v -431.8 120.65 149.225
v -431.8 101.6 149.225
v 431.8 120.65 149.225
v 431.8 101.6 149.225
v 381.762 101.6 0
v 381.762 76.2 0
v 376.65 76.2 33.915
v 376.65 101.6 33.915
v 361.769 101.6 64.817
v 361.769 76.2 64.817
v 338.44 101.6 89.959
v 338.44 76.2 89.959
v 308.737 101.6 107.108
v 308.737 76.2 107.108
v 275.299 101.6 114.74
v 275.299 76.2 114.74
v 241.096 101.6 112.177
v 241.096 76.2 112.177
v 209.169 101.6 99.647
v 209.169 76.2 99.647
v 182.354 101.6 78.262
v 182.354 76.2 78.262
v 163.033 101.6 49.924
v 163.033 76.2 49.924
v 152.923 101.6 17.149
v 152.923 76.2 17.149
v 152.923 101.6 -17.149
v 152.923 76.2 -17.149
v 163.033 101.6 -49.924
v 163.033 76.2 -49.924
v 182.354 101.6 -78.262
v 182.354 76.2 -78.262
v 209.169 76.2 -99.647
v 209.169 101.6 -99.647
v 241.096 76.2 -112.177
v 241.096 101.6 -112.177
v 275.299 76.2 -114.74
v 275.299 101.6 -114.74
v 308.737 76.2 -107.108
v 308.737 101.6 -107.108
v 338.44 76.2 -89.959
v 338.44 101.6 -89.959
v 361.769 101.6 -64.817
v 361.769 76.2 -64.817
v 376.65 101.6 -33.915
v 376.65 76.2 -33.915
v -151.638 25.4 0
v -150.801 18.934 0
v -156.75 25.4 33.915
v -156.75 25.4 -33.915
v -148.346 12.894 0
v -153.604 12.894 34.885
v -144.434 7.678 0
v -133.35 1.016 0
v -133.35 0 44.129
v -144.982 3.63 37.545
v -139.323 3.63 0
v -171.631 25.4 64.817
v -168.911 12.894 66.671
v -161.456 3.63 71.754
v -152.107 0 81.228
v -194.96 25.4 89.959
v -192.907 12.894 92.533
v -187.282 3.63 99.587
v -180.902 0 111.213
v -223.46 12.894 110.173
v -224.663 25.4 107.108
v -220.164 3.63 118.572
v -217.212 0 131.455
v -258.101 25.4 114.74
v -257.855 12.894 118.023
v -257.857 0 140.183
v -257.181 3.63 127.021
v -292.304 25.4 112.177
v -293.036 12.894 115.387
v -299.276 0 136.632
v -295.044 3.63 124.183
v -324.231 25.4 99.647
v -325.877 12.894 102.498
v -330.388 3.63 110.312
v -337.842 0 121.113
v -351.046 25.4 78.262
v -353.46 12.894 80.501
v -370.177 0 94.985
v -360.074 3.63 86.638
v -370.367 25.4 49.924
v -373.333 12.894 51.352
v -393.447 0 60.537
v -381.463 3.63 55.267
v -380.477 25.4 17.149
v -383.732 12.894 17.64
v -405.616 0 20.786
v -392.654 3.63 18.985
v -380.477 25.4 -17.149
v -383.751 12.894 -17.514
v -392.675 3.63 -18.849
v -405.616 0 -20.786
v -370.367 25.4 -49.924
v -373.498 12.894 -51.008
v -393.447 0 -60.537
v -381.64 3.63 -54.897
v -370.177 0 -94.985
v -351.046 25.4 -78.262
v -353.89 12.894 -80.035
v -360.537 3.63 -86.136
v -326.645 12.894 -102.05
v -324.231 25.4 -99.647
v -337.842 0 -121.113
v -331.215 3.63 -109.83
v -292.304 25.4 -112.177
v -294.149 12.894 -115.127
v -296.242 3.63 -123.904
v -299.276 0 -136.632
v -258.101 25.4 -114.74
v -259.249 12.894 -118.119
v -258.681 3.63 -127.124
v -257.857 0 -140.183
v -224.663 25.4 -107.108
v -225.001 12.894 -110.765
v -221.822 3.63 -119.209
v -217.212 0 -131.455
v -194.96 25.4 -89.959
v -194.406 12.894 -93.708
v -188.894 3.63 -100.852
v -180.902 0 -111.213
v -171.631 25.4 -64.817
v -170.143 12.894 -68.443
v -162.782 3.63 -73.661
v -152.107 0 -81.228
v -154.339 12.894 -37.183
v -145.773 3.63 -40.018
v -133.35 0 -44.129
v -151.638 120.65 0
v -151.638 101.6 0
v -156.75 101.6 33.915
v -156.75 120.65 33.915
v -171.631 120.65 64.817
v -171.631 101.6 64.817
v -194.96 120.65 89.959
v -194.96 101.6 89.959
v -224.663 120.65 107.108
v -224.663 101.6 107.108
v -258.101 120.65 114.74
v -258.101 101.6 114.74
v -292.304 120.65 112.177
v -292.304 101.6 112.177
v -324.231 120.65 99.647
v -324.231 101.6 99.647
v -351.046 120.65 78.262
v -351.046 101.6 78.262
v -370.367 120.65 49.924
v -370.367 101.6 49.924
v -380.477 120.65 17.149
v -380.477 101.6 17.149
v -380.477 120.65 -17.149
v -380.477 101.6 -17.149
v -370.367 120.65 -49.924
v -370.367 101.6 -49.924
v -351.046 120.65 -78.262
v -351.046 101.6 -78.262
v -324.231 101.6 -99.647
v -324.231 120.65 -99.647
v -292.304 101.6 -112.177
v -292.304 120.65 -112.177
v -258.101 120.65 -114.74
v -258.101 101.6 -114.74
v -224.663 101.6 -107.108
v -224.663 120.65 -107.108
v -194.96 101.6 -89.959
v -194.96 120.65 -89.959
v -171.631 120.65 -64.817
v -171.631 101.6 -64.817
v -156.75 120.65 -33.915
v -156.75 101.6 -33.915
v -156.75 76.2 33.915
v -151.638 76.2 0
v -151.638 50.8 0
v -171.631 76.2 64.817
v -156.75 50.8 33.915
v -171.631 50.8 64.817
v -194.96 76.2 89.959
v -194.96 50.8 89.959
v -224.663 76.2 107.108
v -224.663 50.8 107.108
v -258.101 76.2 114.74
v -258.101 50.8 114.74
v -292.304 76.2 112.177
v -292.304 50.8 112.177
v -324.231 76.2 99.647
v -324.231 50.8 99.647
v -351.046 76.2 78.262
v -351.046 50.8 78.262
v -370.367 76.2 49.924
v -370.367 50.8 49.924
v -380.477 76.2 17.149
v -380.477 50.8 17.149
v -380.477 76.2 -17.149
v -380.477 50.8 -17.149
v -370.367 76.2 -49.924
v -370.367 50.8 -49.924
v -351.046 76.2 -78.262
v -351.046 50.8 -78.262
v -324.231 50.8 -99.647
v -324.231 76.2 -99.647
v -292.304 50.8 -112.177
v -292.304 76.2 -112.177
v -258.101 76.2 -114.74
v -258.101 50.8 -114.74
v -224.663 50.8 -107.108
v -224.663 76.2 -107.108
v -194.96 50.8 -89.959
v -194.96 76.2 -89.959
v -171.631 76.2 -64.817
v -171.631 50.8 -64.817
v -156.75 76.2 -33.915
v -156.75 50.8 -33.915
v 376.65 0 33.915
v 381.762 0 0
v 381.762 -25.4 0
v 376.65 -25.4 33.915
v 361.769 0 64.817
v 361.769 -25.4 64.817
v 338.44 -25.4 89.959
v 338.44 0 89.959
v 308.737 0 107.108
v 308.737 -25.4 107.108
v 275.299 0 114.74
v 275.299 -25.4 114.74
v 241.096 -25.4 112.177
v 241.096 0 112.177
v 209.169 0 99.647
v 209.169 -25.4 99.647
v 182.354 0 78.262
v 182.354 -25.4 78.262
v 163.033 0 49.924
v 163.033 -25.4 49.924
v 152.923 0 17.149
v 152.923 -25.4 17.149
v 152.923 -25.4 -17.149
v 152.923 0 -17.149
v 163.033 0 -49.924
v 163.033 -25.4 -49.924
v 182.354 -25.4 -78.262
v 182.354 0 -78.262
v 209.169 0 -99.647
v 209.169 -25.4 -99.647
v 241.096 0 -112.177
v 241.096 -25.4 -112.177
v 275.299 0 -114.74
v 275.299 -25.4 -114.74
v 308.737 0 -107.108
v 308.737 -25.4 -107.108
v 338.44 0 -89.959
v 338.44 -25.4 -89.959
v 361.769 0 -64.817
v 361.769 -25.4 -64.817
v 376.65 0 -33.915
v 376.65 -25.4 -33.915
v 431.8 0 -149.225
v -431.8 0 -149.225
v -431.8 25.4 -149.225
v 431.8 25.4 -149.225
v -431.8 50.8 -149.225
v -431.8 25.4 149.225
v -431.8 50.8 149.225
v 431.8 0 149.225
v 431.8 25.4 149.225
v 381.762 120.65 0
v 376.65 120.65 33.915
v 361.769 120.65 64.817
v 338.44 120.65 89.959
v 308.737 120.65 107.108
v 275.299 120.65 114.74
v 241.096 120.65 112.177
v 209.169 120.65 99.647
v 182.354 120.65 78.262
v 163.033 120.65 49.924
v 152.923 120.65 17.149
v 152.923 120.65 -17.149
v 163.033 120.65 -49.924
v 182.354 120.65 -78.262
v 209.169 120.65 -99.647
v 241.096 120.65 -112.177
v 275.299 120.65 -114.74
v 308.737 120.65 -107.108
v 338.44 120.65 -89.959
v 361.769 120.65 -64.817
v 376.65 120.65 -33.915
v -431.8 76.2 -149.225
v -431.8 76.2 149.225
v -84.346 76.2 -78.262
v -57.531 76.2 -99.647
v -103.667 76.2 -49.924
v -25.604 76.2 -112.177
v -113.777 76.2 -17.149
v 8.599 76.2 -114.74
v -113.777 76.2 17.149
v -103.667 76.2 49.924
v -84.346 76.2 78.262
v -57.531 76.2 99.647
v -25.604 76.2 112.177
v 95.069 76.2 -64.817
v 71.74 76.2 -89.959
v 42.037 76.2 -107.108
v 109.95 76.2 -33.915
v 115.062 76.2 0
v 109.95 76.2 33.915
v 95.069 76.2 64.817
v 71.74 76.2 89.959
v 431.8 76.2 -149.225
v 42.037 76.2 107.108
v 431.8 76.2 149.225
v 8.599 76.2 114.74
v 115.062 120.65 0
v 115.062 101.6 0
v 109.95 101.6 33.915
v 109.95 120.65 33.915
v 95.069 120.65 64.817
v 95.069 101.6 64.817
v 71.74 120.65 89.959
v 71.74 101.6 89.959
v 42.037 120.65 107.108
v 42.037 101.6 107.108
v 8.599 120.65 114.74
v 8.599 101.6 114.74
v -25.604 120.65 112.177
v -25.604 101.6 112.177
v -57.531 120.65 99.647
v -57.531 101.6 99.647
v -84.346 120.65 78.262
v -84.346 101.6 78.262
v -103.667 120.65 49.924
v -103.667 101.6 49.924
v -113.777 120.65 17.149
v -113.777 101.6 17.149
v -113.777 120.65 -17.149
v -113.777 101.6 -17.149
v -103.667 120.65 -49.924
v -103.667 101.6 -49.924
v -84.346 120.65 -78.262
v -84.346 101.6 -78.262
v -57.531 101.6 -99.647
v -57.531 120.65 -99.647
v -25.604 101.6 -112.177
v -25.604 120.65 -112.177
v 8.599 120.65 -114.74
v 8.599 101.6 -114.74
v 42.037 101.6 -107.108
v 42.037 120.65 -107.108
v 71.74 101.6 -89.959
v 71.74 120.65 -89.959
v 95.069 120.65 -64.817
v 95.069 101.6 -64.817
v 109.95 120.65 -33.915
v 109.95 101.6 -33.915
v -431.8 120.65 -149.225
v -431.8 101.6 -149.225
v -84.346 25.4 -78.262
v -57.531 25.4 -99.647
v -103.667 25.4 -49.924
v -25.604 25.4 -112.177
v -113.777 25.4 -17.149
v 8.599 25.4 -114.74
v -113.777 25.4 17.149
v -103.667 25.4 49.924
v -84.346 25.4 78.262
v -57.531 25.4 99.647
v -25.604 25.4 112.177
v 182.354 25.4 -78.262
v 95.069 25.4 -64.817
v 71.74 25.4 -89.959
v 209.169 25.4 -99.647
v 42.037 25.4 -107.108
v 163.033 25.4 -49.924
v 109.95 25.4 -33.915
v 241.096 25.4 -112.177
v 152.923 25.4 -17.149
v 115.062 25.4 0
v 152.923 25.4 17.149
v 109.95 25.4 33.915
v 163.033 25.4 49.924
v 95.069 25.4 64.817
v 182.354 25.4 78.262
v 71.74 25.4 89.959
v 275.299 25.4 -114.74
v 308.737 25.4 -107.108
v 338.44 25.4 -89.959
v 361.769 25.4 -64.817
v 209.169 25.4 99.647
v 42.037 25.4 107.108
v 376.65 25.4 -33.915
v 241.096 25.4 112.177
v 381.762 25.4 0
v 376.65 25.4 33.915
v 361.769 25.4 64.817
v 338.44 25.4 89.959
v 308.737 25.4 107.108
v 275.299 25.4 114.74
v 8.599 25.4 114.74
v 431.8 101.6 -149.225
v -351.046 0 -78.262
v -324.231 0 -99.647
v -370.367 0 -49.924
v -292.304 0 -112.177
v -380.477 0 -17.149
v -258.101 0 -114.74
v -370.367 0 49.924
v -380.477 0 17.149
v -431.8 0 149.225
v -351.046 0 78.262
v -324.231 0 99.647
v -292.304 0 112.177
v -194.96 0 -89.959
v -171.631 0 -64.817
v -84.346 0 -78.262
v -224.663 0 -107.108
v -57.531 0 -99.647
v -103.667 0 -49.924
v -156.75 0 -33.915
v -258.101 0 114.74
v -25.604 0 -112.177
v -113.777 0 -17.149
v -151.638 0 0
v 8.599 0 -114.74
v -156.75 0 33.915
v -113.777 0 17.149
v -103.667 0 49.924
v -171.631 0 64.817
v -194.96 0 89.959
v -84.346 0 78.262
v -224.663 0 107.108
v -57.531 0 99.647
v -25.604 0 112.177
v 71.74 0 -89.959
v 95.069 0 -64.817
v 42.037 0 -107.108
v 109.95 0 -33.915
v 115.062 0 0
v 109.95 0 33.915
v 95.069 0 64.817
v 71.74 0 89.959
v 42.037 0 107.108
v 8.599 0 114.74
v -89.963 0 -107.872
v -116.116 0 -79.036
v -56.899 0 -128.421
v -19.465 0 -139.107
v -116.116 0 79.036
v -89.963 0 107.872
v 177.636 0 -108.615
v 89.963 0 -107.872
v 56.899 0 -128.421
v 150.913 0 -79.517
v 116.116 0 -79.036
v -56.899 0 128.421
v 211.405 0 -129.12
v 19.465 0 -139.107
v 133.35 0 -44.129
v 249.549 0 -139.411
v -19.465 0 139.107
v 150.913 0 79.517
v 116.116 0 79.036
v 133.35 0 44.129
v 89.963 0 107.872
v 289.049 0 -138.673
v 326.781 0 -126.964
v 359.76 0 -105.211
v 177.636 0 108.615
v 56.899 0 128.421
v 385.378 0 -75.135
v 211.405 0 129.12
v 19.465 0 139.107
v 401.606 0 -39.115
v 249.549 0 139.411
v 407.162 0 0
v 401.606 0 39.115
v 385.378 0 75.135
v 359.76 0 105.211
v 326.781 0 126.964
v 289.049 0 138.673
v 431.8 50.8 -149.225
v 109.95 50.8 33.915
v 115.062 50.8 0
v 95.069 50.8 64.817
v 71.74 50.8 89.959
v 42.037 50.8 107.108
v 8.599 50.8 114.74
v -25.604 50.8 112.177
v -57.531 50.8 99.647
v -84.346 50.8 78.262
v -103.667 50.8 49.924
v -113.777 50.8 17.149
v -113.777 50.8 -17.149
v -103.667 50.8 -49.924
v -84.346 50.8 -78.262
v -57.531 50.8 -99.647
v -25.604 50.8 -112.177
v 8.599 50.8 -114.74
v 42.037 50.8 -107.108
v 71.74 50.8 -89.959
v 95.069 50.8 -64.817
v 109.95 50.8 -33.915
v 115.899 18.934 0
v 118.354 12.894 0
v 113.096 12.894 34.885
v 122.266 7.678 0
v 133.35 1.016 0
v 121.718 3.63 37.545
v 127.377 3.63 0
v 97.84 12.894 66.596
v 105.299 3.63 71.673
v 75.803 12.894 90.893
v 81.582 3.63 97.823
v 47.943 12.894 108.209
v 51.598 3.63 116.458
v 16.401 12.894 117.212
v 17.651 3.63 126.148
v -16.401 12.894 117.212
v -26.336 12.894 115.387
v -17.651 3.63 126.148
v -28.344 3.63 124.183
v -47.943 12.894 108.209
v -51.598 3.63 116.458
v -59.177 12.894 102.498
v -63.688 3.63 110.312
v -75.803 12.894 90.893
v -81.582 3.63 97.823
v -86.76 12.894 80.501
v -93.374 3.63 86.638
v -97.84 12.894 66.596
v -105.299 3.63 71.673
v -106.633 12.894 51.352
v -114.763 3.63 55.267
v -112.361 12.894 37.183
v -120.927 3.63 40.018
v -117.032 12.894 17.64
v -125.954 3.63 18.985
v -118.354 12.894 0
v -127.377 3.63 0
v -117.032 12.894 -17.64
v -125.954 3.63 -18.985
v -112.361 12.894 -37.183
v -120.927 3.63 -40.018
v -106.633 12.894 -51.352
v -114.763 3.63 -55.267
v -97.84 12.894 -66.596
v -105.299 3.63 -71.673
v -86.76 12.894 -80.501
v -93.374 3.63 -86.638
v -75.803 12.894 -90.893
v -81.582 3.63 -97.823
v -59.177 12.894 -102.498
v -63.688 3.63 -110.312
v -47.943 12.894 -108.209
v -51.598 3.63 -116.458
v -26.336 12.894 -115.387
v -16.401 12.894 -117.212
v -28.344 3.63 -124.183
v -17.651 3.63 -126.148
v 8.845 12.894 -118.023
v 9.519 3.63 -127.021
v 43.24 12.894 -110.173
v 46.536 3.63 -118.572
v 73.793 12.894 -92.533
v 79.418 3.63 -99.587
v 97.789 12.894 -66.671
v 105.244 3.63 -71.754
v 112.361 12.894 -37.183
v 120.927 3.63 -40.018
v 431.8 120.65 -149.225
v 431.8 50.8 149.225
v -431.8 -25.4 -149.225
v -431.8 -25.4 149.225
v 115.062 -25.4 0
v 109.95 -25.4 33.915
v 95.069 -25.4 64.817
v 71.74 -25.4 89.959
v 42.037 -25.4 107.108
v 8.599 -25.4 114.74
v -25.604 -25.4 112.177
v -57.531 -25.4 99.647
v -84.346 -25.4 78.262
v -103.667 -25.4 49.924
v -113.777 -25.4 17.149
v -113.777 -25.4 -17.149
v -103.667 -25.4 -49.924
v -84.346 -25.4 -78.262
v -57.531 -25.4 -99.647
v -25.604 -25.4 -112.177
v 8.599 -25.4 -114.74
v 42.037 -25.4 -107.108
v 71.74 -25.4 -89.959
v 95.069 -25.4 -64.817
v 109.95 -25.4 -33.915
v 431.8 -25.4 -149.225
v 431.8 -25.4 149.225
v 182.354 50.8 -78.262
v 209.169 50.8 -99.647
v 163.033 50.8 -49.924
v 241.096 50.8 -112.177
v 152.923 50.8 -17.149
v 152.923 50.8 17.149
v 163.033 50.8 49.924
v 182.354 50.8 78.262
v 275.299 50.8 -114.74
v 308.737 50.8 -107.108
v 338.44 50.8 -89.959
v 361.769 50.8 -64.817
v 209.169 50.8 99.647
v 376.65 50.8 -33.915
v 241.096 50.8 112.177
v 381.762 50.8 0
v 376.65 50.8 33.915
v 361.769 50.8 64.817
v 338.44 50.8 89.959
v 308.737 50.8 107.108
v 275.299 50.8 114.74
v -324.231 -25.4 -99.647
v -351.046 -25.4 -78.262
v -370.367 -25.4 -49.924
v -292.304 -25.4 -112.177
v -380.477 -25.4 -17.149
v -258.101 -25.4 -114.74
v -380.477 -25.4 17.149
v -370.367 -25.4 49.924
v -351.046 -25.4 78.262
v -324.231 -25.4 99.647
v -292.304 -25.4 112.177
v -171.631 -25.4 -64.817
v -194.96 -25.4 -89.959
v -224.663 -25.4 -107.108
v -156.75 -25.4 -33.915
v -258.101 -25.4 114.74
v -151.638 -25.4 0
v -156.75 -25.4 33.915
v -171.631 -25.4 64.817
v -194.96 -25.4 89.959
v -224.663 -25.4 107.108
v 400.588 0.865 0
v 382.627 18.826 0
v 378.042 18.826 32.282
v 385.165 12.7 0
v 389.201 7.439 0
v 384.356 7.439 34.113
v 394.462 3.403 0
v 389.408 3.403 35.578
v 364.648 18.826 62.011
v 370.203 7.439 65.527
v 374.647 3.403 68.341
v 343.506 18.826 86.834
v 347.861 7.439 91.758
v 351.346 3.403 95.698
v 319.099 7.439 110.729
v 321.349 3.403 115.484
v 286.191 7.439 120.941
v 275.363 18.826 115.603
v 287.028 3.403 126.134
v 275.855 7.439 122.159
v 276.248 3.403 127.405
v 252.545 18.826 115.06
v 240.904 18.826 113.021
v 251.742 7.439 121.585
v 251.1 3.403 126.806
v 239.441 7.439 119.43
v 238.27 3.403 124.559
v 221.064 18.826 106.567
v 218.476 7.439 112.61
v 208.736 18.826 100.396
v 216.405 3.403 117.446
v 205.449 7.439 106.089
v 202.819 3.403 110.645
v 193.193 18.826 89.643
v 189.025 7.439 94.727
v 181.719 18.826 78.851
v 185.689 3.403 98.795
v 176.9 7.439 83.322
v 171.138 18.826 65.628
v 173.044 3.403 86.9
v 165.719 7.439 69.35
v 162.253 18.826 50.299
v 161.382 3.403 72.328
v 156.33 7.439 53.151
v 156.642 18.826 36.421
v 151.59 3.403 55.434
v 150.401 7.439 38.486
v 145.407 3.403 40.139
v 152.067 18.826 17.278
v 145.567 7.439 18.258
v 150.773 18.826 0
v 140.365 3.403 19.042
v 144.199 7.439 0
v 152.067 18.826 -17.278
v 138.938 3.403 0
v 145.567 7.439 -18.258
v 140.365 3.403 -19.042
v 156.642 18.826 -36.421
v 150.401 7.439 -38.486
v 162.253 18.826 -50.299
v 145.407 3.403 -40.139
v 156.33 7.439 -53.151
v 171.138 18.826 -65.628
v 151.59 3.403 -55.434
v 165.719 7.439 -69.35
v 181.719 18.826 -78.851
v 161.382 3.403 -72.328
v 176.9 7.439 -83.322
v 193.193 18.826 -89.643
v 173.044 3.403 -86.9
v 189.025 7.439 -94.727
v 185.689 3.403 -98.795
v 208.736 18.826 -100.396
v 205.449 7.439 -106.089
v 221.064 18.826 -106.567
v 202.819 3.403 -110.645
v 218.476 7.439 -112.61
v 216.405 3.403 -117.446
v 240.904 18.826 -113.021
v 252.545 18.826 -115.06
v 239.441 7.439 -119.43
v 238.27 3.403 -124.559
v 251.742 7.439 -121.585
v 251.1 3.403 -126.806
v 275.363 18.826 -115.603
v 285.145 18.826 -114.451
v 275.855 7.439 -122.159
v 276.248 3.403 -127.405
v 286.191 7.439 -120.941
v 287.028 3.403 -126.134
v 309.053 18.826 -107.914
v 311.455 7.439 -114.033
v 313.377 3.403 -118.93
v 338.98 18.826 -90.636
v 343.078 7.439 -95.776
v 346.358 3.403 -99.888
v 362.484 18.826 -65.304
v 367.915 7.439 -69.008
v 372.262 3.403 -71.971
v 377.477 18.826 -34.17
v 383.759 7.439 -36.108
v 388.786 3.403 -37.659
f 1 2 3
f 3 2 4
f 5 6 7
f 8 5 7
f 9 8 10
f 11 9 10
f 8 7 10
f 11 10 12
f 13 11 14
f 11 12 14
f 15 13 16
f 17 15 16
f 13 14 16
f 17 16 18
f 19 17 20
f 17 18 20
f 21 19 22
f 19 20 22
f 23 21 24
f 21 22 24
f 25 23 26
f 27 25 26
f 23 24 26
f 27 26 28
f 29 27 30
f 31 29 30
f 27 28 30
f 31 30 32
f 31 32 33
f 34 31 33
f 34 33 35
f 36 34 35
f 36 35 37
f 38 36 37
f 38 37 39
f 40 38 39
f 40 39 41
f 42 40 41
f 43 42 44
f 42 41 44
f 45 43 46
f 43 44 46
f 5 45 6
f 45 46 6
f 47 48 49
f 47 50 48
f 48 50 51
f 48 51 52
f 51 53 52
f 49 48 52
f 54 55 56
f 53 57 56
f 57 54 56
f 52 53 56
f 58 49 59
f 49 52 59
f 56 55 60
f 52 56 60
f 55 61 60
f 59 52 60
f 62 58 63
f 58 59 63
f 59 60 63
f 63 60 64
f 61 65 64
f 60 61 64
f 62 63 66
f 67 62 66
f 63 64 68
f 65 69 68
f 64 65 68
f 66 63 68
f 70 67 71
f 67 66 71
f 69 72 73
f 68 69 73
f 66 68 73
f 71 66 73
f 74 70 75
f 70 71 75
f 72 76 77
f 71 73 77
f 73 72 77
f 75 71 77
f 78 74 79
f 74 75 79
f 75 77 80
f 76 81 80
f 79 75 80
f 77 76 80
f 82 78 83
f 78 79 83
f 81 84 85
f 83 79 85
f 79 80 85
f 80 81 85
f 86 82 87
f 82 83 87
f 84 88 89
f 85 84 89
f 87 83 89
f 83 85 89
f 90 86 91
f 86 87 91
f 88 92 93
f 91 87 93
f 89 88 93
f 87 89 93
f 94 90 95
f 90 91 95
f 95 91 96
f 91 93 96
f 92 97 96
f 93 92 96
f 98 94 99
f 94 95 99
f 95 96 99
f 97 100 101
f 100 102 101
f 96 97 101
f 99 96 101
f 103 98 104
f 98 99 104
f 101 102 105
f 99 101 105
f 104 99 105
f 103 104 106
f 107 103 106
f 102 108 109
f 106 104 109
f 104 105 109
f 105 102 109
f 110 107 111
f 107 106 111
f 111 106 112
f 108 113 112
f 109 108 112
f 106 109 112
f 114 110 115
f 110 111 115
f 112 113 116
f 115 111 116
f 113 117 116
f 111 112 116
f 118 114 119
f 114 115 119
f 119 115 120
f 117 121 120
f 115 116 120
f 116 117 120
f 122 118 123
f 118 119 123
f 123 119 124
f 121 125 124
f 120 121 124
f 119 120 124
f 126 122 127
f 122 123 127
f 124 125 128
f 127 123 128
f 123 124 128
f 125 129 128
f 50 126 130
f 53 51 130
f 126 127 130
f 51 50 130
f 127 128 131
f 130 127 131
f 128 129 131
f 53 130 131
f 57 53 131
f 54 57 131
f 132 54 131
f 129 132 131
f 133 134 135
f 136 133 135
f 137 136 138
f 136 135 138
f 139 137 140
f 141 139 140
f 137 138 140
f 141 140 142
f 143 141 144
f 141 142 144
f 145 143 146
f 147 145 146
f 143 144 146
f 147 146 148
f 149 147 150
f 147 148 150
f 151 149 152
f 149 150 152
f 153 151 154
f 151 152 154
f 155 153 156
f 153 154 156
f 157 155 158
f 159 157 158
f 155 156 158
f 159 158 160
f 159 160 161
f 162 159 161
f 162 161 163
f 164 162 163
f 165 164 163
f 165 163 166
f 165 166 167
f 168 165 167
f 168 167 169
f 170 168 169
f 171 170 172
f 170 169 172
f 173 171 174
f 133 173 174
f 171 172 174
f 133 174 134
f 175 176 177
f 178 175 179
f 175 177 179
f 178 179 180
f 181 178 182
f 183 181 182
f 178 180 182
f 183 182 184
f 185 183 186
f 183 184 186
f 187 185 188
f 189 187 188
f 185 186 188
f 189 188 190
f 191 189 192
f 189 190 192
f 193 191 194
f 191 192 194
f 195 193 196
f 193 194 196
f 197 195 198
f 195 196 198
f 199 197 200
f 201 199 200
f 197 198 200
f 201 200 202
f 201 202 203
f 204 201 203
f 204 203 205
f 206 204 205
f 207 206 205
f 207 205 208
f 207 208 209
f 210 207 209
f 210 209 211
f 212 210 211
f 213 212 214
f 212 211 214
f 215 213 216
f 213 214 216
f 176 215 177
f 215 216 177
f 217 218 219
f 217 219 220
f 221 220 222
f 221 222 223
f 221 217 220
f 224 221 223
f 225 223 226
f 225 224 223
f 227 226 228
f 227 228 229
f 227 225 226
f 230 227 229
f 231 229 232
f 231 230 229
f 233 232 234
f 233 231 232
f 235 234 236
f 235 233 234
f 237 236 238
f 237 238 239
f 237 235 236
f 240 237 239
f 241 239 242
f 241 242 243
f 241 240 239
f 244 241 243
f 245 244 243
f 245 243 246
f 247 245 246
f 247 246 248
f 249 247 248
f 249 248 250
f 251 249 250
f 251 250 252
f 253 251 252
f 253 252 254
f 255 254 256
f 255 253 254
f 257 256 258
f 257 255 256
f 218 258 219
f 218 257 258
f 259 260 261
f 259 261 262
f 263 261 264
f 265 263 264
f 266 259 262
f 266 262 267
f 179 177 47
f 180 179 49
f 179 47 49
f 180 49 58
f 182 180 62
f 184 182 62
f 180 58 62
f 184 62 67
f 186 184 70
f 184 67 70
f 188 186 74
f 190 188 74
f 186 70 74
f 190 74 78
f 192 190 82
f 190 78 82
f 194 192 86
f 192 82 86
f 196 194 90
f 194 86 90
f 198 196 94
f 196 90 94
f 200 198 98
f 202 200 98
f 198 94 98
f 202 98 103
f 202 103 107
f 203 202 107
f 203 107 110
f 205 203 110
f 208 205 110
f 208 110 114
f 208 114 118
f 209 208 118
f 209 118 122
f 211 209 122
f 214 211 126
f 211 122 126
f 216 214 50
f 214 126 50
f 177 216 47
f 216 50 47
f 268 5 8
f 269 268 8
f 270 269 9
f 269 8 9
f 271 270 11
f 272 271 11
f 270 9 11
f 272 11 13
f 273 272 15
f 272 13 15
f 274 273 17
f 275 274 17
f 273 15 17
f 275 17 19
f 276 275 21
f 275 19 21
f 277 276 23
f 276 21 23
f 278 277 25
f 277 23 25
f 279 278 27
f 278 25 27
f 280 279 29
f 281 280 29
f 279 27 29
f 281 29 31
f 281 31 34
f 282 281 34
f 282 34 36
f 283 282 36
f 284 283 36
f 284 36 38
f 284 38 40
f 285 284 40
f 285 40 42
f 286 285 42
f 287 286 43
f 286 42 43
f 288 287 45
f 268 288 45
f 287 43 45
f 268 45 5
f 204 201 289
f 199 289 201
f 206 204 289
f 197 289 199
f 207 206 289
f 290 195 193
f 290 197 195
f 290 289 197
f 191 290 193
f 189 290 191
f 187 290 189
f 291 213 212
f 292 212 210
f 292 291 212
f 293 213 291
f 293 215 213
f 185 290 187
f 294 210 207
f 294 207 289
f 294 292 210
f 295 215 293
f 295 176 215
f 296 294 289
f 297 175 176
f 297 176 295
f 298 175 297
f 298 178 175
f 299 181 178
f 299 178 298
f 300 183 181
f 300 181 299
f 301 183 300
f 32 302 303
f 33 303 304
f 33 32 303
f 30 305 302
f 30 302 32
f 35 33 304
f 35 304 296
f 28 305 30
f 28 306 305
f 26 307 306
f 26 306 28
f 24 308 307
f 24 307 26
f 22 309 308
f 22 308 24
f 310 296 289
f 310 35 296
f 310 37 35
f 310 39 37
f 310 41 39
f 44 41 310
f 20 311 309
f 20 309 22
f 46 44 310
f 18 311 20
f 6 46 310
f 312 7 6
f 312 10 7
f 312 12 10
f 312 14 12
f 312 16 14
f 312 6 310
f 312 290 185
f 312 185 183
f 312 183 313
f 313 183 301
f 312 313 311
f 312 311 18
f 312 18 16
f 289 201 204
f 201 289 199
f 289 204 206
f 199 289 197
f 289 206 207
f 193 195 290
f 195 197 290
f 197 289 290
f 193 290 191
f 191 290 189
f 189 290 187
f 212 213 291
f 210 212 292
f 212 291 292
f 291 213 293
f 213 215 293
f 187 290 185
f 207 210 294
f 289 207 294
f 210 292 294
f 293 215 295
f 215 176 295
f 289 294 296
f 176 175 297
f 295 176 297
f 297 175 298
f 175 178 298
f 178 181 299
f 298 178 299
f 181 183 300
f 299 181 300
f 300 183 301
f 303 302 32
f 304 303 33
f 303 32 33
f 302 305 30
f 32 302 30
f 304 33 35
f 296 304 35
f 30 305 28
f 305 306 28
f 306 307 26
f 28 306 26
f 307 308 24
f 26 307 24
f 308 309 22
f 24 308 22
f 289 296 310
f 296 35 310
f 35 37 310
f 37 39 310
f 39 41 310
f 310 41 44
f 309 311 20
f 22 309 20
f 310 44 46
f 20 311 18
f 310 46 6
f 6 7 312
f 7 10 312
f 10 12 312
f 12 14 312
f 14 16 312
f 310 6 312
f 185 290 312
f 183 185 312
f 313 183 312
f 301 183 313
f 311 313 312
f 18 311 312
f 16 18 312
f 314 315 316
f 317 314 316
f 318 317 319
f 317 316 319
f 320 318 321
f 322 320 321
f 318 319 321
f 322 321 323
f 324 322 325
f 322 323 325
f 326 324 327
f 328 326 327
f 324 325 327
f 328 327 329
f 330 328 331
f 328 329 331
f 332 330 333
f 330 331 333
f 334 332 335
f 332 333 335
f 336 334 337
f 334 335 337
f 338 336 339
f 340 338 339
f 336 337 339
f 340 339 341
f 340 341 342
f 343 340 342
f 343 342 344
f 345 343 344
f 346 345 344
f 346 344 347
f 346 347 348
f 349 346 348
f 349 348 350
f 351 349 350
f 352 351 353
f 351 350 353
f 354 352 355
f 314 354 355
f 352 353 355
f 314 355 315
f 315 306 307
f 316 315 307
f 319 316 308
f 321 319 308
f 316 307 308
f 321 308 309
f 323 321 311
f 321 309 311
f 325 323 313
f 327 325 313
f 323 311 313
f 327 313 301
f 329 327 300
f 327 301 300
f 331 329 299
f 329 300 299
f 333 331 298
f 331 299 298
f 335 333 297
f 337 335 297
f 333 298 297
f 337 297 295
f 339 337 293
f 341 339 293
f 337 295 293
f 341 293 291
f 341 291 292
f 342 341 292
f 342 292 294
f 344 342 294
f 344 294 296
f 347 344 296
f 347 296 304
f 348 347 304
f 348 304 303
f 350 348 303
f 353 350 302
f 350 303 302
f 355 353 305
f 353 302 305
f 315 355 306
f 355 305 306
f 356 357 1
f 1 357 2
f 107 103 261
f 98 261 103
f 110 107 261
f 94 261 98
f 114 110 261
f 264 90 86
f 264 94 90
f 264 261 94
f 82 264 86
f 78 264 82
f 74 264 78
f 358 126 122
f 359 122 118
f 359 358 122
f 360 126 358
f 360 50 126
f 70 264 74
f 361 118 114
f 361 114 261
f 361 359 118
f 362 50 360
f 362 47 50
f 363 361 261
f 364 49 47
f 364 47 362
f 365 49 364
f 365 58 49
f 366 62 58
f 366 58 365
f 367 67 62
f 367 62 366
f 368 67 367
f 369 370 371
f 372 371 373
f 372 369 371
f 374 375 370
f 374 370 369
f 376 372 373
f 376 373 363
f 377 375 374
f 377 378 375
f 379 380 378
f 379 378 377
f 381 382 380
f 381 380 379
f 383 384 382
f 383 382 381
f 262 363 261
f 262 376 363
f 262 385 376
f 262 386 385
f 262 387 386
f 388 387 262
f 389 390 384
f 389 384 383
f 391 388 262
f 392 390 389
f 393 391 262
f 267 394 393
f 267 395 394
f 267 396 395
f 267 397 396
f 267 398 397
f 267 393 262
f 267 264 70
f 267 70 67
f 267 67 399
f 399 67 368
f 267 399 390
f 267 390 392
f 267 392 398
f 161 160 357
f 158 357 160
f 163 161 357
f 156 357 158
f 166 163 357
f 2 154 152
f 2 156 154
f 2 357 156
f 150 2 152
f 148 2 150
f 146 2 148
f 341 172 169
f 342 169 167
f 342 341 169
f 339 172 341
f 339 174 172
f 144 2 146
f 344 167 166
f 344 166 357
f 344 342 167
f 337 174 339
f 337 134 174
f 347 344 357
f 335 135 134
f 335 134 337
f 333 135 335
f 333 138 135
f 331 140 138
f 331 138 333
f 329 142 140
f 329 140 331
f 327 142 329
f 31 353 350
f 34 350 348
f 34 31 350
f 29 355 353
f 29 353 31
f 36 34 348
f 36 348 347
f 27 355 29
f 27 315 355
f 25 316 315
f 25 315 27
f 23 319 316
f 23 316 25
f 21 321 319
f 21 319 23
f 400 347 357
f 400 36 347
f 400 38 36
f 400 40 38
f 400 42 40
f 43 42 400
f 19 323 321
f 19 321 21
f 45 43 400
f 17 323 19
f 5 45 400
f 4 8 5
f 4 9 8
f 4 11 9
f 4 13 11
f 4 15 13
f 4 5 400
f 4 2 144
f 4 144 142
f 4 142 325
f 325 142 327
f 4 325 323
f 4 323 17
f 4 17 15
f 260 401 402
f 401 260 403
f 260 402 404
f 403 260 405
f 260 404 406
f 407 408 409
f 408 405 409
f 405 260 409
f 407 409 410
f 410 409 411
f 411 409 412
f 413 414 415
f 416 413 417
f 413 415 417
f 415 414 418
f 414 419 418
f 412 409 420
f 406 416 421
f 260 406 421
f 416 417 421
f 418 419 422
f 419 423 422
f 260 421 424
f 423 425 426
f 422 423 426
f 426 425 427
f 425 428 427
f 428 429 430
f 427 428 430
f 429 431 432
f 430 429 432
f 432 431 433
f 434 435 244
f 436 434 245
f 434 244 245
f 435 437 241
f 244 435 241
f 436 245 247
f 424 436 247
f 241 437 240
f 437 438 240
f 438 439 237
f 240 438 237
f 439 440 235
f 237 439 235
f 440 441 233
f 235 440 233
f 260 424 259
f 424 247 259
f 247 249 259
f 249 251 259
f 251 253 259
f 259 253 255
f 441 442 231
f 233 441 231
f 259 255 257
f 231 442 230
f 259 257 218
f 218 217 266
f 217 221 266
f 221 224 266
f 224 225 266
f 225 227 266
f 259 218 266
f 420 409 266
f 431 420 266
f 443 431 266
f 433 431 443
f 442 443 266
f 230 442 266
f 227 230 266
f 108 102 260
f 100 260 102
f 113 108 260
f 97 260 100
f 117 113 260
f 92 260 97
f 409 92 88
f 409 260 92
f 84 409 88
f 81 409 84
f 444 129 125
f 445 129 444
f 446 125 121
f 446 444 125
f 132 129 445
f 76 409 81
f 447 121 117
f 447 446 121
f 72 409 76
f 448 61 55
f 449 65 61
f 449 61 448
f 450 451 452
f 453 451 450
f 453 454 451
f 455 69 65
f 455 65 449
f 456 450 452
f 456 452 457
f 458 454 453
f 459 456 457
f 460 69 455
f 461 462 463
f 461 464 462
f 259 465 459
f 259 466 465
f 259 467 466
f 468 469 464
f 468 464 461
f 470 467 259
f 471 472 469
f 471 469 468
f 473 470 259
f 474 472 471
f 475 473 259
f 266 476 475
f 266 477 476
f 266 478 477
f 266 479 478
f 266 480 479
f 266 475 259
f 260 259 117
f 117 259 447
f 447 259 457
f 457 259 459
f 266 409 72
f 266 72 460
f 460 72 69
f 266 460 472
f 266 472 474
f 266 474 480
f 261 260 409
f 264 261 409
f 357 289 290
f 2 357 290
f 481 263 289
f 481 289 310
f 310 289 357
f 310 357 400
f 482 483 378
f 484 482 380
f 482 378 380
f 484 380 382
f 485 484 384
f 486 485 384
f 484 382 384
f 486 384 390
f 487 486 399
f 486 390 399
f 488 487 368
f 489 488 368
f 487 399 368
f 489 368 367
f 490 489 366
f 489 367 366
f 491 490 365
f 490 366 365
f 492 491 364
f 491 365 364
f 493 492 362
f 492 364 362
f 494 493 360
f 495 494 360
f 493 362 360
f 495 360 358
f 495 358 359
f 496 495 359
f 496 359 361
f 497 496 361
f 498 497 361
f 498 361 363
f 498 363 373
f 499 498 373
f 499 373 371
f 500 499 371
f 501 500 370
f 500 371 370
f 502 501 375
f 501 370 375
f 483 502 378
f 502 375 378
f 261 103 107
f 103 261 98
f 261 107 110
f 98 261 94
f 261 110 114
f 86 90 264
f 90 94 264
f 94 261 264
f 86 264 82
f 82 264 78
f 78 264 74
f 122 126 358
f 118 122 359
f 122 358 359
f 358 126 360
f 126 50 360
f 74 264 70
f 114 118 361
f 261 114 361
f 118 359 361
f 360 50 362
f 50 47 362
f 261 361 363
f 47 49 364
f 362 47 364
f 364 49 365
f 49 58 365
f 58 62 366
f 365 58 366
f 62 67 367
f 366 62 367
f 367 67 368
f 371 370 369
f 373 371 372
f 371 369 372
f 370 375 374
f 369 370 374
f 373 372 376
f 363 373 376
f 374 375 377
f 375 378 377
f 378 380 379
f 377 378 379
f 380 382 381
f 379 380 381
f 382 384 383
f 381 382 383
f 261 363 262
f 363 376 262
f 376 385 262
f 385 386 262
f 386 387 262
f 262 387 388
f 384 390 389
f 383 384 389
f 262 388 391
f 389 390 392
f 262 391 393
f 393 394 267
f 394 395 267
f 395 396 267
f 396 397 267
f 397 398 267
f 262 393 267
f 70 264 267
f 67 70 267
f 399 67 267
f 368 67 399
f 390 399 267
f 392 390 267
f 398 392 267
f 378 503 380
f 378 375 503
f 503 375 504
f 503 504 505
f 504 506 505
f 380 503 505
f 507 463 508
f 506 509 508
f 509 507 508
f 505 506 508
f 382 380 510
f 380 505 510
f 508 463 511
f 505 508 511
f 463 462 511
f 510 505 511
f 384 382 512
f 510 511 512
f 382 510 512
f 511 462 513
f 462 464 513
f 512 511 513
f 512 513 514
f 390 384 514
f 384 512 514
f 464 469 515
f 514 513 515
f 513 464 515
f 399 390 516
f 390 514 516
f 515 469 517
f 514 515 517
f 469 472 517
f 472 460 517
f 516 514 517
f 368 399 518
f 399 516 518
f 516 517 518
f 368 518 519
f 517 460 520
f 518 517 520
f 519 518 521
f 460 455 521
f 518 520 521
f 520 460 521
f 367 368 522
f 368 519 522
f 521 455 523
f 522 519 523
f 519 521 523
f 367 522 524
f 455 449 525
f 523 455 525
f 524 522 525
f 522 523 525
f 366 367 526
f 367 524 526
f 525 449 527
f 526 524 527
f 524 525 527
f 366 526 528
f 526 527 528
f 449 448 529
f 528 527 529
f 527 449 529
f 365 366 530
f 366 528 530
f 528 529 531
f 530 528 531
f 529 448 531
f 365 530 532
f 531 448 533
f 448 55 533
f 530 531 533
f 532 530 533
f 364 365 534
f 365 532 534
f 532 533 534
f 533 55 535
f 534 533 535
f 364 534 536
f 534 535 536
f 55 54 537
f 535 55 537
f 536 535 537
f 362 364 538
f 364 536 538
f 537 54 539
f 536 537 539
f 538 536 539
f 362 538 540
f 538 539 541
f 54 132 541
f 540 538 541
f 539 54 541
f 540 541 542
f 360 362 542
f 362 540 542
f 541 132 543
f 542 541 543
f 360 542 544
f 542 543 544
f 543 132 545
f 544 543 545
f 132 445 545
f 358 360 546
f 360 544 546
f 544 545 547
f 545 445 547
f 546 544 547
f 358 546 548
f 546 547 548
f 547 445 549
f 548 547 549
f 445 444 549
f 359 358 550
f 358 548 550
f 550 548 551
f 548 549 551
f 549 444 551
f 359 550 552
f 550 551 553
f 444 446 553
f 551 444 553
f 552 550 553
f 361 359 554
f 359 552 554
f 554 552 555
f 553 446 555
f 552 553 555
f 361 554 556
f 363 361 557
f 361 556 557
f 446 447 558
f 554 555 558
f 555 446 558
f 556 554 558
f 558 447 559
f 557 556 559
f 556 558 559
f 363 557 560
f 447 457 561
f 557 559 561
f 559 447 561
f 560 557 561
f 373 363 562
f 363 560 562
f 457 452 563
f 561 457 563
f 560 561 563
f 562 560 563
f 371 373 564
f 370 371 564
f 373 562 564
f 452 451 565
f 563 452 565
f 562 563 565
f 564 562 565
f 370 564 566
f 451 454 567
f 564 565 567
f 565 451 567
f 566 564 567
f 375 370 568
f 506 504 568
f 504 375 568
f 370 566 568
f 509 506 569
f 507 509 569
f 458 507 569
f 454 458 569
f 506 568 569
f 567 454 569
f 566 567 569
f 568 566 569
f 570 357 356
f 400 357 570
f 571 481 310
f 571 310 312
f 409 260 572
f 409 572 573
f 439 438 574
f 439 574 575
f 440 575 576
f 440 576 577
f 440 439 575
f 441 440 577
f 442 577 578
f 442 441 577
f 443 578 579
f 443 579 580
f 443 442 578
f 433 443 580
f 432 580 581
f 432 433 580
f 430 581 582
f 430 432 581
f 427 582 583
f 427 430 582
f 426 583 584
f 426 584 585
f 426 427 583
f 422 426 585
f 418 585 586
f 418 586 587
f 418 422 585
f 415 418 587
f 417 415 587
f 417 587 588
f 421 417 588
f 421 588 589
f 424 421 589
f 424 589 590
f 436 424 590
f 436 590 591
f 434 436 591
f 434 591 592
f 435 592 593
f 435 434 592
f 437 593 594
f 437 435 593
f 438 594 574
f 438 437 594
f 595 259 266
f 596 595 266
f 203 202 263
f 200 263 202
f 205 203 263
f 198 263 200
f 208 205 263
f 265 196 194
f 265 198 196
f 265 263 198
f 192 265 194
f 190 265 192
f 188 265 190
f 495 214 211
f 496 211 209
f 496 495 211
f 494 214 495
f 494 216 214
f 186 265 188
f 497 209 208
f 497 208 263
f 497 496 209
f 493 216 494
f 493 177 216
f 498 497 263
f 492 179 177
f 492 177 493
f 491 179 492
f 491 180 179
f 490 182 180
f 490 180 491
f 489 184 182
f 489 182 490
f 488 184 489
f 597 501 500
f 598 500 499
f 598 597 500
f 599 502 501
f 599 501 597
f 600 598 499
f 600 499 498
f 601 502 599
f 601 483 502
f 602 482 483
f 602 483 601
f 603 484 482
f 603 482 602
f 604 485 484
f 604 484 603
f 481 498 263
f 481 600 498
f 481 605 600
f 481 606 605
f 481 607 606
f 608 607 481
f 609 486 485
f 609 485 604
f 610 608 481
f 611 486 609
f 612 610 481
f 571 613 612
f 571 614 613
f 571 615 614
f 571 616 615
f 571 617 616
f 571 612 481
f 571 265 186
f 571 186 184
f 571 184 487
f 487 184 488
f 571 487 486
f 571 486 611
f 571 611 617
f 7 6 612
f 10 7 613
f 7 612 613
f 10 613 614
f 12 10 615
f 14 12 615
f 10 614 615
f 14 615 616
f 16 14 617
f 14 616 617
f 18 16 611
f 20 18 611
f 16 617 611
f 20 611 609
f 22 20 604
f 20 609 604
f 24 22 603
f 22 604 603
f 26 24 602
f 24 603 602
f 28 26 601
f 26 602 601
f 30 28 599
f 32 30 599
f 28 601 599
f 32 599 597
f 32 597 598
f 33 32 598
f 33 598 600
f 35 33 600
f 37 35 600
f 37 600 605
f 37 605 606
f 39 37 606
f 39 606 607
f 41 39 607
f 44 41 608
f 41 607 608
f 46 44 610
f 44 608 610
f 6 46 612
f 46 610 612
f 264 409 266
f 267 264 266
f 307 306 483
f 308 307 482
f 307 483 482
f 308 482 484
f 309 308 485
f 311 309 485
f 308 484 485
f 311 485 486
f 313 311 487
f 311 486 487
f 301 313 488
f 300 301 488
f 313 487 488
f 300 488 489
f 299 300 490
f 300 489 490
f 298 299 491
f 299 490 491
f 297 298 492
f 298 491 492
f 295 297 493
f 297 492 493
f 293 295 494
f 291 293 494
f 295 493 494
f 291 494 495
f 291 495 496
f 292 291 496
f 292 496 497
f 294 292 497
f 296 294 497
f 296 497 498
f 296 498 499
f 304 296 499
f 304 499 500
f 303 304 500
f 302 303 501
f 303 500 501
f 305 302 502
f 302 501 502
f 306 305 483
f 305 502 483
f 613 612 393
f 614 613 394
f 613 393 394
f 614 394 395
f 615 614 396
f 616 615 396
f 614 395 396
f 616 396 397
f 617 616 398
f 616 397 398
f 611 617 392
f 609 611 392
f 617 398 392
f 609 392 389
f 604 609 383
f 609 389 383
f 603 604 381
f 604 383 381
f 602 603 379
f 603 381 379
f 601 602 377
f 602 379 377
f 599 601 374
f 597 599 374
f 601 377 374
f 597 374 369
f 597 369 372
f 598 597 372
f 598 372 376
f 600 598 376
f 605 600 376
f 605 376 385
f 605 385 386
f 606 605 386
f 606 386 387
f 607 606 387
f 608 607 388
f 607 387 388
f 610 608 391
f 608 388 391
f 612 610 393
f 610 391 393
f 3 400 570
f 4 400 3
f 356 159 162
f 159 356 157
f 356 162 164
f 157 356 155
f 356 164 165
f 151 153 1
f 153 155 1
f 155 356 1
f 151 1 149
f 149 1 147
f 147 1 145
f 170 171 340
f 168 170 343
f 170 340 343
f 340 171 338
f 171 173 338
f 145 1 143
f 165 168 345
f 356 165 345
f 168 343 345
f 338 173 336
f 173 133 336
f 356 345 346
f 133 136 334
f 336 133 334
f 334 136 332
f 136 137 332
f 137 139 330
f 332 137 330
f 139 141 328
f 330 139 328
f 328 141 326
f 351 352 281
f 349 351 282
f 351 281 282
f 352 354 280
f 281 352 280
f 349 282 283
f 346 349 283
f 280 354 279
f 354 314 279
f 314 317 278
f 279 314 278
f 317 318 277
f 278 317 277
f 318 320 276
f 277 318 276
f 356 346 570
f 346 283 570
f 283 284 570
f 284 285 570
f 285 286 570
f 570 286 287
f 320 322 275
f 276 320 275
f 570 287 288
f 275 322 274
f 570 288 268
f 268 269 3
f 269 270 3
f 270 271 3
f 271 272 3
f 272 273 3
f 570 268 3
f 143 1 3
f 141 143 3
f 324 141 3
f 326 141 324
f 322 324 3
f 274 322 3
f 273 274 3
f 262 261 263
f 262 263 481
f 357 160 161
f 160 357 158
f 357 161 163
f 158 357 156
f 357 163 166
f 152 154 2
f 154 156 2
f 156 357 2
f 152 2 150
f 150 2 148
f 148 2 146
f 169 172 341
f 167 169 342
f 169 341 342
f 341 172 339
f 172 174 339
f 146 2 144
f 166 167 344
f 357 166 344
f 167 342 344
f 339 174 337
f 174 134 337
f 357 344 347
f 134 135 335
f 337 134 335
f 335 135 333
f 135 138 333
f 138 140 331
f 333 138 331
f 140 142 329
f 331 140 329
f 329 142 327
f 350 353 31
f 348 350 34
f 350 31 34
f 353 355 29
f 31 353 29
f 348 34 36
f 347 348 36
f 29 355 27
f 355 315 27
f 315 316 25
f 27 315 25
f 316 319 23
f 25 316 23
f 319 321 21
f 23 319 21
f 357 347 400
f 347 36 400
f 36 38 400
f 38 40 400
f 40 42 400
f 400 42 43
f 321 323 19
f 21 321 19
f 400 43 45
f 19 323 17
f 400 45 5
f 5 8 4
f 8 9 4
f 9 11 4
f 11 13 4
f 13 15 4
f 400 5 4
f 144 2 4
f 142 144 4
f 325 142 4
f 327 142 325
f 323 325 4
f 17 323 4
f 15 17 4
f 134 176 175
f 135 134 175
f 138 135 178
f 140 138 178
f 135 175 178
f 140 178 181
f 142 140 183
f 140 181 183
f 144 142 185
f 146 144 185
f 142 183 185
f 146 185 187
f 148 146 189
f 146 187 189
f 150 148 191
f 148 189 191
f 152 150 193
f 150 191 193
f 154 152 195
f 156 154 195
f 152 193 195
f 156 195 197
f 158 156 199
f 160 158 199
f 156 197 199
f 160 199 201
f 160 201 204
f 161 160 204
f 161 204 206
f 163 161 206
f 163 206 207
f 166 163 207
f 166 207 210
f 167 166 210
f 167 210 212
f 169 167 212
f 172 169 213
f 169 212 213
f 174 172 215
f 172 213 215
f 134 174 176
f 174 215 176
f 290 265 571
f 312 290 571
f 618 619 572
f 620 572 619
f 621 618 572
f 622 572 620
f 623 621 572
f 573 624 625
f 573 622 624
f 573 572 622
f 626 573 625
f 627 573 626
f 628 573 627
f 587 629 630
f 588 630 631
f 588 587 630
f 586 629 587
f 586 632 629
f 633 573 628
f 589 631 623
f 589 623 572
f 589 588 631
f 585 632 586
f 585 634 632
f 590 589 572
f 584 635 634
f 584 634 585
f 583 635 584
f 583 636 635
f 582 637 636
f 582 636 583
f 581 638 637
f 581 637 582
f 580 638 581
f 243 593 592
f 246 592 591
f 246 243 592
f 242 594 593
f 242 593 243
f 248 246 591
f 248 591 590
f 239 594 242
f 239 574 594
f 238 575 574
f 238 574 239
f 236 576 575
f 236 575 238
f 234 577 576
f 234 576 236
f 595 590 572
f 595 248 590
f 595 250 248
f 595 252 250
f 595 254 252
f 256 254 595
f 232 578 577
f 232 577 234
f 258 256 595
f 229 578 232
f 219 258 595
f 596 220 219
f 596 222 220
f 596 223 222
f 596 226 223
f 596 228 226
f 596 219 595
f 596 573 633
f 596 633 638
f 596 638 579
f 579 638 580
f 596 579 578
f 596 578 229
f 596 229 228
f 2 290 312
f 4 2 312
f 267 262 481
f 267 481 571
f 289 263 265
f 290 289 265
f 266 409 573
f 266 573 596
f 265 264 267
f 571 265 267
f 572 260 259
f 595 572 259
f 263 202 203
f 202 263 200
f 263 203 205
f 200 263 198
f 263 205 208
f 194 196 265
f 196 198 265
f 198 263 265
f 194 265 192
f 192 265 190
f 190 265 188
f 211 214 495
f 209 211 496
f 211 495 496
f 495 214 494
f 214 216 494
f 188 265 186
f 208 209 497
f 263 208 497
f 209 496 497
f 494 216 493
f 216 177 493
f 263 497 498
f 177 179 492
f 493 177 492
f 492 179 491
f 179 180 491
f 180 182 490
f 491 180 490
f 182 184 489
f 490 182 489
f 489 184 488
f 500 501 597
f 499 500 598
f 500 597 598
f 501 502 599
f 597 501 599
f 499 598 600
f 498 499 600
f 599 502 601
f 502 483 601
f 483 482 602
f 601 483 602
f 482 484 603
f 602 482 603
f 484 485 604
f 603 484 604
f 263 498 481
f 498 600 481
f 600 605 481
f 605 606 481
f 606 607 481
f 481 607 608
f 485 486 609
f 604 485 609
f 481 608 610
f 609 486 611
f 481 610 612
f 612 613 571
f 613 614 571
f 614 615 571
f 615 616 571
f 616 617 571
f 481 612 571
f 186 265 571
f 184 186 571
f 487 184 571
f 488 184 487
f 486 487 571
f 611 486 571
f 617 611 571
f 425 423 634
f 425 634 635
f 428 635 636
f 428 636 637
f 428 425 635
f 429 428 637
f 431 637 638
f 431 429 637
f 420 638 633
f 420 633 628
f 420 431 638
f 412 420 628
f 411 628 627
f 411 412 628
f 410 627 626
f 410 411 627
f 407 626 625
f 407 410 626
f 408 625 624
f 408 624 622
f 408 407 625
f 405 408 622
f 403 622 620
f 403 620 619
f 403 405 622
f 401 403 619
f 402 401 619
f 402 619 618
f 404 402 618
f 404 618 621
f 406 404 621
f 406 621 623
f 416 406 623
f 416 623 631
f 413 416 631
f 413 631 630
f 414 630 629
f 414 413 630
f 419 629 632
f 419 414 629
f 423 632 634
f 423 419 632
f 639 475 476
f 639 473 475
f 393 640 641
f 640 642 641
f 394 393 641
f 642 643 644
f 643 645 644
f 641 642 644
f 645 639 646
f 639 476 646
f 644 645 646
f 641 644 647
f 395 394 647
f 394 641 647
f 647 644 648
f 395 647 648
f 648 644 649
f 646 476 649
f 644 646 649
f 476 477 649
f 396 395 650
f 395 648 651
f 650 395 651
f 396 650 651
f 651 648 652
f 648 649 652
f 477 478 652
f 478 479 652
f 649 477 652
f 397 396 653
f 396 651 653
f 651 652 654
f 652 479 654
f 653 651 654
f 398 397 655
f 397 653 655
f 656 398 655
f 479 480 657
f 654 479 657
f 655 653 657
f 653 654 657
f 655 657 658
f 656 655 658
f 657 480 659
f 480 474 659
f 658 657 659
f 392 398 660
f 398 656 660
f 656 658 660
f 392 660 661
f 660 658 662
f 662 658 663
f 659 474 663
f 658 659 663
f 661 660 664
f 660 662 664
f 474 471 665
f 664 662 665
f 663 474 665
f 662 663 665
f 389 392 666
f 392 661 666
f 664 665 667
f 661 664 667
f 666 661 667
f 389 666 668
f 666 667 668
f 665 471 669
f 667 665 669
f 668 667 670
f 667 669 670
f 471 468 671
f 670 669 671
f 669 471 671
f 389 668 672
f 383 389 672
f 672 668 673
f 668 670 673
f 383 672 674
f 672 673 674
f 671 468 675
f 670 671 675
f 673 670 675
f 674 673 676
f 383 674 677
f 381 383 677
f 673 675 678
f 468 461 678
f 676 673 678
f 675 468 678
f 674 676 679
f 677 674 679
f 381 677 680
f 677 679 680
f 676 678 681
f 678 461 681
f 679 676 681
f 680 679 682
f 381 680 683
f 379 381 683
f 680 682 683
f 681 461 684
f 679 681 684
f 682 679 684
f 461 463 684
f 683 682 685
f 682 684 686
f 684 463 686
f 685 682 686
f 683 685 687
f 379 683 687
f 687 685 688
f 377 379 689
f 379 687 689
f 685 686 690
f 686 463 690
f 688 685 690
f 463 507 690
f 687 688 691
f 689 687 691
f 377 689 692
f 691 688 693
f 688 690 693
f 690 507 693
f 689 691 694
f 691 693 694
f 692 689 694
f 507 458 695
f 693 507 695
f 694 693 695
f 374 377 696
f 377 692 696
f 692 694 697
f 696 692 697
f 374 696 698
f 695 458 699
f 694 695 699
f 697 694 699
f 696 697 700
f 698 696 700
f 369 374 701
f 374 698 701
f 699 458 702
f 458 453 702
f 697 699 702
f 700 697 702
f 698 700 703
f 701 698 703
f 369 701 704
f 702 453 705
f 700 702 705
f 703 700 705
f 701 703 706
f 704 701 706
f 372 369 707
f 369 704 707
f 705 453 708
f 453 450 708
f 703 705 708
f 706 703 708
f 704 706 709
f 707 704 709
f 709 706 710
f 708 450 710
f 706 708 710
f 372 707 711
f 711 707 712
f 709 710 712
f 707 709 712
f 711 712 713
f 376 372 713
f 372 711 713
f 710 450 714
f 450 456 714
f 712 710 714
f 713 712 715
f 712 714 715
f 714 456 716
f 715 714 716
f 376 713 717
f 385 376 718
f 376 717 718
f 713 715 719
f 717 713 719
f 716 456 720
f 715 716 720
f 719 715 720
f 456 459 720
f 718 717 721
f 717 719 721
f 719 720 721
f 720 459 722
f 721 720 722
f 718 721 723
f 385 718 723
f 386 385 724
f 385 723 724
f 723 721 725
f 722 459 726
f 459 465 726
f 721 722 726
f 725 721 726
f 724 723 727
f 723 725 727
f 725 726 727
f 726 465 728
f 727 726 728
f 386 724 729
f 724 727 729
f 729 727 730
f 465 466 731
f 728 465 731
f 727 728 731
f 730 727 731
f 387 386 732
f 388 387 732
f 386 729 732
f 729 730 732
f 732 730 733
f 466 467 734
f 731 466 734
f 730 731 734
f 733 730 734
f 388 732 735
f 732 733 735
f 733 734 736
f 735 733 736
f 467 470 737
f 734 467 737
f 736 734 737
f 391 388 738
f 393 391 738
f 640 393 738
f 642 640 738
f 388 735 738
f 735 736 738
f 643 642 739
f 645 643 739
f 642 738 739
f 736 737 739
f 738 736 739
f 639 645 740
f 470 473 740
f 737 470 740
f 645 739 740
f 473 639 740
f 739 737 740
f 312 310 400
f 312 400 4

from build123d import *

# Parameters (mm, degrees)
F0_W     = 863.6
F0_H     = 298.45
F0_R     = 115.062
F1_DEPTH = 25.4
F2_DEPTH = 25.4
F3_DEPTH = 25.4
F4_DEPTH = 25.4
F5_DEPTH = 25.4
F6_DEPTH = 19.05


# Not quite as in the source:
# - a fillet or chamfer that OpenCascade refuses, or shapes differently, is made with other operations: its cross-section is extruded or revolved along the edge and cut away or added


with BuildPart() as f1:
    # F0 (on Front) → F1 (new body)
    with BuildSketch(Plane.XZ):
        Rectangle(F0_W, F0_H)
        with Locations((-266.7, 0)):
            Circle(F0_R, mode=Mode.SUBTRACT)
        Circle(F0_R, mode=Mode.SUBTRACT)
        with Locations((266.7, 0)):
            Circle(F0_R, mode=Mode.SUBTRACT)
    extrude(amount=F1_DEPTH)


with BuildPart() as f2:
    # F2 (new): a face of the model
    f2_faces = [f1.part.faces().sort_by_distance(p)[0] for p in [
        (422.6628376259, 0, 0),
    ]]
    extrude(f2_faces, amount=F2_DEPTH)


with BuildPart() as f3:
    # F3 (new): a face of the model
    f3_faces = [f2.part.faces().sort_by_distance(p)[0] for p in [
        (422.6628376259, 25.4, 0),
    ]]
    extrude(f3_faces, amount=F3_DEPTH)


with BuildPart() as f4:
    # F4 (new): a face of the model
    f4_faces = [f3.part.faces().sort_by_distance(p)[0] for p in [
        (422.6628376259, 50.8, 0),
    ]]
    extrude(f4_faces, amount=F4_DEPTH)


with BuildPart() as f5:
    # F5 (new): a face of the model
    f5_faces = [f4.part.faces().sort_by_distance(p)[0] for p in [
        (422.6628376259, 76.2, 0),
    ]]
    extrude(f5_faces, amount=F5_DEPTH)


with BuildPart() as f6:
    # F6 (new): a face of the model
    f6_faces = [f5.part.faces().sort_by_distance(p)[0] for p in [
        (422.6628376259, 101.6, 0),
    ]]
    extrude(f6_faces, amount=F6_DEPTH)


with BuildPart() as f2_1:
    add(f2.part)

    # F7: fillet of radius 25.4 on 3 edges, made by hand

    # F7_s1 → F7_t2 (revolve, cut)
    with BuildSketch(Plane.XY):
        with BuildLine():
            ThreePointArc((-151.638, 25.4), (-144.1985122421, 7.4394877579), (-126.238, 0))
            Line((-126.238, 0), (-151.638, 0))
            Line((-151.638, 0), (-151.638, 25.4))
        make_face()
    revolve(axis=Axis((-266.7, 0, 0), (0, -1, 0)), mode=Mode.SUBTRACT)

    # F7_s3 → F7_t4 (revolve, cut)
    with BuildSketch(Plane.XY):
        with BuildLine():
            ThreePointArc((115.062, 25.4), (122.5014877579, 7.4394877579), (140.462, 0))
            Line((140.462, 0), (115.062, 0))
            Line((115.062, 0), (115.062, 25.4))
        make_face()
    revolve(axis=Axis((0, 0, 0), (0, -1, 0)), mode=Mode.SUBTRACT)

    # F7_s5 → F7_t6 (revolve, cut)
    with BuildSketch(Plane.XY):
        with BuildLine():
            ThreePointArc((381.762, 25.4), (389.2014877579, 7.4394877579), (407.162, 0))
            Line((407.162, 0), (381.762, 0))
            Line((381.762, 0), (381.762, 25.4))
        make_face()
    revolve(axis=Axis((266.7, 0, 0), (0, -1, 0)), mode=Mode.SUBTRACT)


solid = Compound([f1.part, f3.part, f4.part, f5.part, f6.part, f2_1.part])
